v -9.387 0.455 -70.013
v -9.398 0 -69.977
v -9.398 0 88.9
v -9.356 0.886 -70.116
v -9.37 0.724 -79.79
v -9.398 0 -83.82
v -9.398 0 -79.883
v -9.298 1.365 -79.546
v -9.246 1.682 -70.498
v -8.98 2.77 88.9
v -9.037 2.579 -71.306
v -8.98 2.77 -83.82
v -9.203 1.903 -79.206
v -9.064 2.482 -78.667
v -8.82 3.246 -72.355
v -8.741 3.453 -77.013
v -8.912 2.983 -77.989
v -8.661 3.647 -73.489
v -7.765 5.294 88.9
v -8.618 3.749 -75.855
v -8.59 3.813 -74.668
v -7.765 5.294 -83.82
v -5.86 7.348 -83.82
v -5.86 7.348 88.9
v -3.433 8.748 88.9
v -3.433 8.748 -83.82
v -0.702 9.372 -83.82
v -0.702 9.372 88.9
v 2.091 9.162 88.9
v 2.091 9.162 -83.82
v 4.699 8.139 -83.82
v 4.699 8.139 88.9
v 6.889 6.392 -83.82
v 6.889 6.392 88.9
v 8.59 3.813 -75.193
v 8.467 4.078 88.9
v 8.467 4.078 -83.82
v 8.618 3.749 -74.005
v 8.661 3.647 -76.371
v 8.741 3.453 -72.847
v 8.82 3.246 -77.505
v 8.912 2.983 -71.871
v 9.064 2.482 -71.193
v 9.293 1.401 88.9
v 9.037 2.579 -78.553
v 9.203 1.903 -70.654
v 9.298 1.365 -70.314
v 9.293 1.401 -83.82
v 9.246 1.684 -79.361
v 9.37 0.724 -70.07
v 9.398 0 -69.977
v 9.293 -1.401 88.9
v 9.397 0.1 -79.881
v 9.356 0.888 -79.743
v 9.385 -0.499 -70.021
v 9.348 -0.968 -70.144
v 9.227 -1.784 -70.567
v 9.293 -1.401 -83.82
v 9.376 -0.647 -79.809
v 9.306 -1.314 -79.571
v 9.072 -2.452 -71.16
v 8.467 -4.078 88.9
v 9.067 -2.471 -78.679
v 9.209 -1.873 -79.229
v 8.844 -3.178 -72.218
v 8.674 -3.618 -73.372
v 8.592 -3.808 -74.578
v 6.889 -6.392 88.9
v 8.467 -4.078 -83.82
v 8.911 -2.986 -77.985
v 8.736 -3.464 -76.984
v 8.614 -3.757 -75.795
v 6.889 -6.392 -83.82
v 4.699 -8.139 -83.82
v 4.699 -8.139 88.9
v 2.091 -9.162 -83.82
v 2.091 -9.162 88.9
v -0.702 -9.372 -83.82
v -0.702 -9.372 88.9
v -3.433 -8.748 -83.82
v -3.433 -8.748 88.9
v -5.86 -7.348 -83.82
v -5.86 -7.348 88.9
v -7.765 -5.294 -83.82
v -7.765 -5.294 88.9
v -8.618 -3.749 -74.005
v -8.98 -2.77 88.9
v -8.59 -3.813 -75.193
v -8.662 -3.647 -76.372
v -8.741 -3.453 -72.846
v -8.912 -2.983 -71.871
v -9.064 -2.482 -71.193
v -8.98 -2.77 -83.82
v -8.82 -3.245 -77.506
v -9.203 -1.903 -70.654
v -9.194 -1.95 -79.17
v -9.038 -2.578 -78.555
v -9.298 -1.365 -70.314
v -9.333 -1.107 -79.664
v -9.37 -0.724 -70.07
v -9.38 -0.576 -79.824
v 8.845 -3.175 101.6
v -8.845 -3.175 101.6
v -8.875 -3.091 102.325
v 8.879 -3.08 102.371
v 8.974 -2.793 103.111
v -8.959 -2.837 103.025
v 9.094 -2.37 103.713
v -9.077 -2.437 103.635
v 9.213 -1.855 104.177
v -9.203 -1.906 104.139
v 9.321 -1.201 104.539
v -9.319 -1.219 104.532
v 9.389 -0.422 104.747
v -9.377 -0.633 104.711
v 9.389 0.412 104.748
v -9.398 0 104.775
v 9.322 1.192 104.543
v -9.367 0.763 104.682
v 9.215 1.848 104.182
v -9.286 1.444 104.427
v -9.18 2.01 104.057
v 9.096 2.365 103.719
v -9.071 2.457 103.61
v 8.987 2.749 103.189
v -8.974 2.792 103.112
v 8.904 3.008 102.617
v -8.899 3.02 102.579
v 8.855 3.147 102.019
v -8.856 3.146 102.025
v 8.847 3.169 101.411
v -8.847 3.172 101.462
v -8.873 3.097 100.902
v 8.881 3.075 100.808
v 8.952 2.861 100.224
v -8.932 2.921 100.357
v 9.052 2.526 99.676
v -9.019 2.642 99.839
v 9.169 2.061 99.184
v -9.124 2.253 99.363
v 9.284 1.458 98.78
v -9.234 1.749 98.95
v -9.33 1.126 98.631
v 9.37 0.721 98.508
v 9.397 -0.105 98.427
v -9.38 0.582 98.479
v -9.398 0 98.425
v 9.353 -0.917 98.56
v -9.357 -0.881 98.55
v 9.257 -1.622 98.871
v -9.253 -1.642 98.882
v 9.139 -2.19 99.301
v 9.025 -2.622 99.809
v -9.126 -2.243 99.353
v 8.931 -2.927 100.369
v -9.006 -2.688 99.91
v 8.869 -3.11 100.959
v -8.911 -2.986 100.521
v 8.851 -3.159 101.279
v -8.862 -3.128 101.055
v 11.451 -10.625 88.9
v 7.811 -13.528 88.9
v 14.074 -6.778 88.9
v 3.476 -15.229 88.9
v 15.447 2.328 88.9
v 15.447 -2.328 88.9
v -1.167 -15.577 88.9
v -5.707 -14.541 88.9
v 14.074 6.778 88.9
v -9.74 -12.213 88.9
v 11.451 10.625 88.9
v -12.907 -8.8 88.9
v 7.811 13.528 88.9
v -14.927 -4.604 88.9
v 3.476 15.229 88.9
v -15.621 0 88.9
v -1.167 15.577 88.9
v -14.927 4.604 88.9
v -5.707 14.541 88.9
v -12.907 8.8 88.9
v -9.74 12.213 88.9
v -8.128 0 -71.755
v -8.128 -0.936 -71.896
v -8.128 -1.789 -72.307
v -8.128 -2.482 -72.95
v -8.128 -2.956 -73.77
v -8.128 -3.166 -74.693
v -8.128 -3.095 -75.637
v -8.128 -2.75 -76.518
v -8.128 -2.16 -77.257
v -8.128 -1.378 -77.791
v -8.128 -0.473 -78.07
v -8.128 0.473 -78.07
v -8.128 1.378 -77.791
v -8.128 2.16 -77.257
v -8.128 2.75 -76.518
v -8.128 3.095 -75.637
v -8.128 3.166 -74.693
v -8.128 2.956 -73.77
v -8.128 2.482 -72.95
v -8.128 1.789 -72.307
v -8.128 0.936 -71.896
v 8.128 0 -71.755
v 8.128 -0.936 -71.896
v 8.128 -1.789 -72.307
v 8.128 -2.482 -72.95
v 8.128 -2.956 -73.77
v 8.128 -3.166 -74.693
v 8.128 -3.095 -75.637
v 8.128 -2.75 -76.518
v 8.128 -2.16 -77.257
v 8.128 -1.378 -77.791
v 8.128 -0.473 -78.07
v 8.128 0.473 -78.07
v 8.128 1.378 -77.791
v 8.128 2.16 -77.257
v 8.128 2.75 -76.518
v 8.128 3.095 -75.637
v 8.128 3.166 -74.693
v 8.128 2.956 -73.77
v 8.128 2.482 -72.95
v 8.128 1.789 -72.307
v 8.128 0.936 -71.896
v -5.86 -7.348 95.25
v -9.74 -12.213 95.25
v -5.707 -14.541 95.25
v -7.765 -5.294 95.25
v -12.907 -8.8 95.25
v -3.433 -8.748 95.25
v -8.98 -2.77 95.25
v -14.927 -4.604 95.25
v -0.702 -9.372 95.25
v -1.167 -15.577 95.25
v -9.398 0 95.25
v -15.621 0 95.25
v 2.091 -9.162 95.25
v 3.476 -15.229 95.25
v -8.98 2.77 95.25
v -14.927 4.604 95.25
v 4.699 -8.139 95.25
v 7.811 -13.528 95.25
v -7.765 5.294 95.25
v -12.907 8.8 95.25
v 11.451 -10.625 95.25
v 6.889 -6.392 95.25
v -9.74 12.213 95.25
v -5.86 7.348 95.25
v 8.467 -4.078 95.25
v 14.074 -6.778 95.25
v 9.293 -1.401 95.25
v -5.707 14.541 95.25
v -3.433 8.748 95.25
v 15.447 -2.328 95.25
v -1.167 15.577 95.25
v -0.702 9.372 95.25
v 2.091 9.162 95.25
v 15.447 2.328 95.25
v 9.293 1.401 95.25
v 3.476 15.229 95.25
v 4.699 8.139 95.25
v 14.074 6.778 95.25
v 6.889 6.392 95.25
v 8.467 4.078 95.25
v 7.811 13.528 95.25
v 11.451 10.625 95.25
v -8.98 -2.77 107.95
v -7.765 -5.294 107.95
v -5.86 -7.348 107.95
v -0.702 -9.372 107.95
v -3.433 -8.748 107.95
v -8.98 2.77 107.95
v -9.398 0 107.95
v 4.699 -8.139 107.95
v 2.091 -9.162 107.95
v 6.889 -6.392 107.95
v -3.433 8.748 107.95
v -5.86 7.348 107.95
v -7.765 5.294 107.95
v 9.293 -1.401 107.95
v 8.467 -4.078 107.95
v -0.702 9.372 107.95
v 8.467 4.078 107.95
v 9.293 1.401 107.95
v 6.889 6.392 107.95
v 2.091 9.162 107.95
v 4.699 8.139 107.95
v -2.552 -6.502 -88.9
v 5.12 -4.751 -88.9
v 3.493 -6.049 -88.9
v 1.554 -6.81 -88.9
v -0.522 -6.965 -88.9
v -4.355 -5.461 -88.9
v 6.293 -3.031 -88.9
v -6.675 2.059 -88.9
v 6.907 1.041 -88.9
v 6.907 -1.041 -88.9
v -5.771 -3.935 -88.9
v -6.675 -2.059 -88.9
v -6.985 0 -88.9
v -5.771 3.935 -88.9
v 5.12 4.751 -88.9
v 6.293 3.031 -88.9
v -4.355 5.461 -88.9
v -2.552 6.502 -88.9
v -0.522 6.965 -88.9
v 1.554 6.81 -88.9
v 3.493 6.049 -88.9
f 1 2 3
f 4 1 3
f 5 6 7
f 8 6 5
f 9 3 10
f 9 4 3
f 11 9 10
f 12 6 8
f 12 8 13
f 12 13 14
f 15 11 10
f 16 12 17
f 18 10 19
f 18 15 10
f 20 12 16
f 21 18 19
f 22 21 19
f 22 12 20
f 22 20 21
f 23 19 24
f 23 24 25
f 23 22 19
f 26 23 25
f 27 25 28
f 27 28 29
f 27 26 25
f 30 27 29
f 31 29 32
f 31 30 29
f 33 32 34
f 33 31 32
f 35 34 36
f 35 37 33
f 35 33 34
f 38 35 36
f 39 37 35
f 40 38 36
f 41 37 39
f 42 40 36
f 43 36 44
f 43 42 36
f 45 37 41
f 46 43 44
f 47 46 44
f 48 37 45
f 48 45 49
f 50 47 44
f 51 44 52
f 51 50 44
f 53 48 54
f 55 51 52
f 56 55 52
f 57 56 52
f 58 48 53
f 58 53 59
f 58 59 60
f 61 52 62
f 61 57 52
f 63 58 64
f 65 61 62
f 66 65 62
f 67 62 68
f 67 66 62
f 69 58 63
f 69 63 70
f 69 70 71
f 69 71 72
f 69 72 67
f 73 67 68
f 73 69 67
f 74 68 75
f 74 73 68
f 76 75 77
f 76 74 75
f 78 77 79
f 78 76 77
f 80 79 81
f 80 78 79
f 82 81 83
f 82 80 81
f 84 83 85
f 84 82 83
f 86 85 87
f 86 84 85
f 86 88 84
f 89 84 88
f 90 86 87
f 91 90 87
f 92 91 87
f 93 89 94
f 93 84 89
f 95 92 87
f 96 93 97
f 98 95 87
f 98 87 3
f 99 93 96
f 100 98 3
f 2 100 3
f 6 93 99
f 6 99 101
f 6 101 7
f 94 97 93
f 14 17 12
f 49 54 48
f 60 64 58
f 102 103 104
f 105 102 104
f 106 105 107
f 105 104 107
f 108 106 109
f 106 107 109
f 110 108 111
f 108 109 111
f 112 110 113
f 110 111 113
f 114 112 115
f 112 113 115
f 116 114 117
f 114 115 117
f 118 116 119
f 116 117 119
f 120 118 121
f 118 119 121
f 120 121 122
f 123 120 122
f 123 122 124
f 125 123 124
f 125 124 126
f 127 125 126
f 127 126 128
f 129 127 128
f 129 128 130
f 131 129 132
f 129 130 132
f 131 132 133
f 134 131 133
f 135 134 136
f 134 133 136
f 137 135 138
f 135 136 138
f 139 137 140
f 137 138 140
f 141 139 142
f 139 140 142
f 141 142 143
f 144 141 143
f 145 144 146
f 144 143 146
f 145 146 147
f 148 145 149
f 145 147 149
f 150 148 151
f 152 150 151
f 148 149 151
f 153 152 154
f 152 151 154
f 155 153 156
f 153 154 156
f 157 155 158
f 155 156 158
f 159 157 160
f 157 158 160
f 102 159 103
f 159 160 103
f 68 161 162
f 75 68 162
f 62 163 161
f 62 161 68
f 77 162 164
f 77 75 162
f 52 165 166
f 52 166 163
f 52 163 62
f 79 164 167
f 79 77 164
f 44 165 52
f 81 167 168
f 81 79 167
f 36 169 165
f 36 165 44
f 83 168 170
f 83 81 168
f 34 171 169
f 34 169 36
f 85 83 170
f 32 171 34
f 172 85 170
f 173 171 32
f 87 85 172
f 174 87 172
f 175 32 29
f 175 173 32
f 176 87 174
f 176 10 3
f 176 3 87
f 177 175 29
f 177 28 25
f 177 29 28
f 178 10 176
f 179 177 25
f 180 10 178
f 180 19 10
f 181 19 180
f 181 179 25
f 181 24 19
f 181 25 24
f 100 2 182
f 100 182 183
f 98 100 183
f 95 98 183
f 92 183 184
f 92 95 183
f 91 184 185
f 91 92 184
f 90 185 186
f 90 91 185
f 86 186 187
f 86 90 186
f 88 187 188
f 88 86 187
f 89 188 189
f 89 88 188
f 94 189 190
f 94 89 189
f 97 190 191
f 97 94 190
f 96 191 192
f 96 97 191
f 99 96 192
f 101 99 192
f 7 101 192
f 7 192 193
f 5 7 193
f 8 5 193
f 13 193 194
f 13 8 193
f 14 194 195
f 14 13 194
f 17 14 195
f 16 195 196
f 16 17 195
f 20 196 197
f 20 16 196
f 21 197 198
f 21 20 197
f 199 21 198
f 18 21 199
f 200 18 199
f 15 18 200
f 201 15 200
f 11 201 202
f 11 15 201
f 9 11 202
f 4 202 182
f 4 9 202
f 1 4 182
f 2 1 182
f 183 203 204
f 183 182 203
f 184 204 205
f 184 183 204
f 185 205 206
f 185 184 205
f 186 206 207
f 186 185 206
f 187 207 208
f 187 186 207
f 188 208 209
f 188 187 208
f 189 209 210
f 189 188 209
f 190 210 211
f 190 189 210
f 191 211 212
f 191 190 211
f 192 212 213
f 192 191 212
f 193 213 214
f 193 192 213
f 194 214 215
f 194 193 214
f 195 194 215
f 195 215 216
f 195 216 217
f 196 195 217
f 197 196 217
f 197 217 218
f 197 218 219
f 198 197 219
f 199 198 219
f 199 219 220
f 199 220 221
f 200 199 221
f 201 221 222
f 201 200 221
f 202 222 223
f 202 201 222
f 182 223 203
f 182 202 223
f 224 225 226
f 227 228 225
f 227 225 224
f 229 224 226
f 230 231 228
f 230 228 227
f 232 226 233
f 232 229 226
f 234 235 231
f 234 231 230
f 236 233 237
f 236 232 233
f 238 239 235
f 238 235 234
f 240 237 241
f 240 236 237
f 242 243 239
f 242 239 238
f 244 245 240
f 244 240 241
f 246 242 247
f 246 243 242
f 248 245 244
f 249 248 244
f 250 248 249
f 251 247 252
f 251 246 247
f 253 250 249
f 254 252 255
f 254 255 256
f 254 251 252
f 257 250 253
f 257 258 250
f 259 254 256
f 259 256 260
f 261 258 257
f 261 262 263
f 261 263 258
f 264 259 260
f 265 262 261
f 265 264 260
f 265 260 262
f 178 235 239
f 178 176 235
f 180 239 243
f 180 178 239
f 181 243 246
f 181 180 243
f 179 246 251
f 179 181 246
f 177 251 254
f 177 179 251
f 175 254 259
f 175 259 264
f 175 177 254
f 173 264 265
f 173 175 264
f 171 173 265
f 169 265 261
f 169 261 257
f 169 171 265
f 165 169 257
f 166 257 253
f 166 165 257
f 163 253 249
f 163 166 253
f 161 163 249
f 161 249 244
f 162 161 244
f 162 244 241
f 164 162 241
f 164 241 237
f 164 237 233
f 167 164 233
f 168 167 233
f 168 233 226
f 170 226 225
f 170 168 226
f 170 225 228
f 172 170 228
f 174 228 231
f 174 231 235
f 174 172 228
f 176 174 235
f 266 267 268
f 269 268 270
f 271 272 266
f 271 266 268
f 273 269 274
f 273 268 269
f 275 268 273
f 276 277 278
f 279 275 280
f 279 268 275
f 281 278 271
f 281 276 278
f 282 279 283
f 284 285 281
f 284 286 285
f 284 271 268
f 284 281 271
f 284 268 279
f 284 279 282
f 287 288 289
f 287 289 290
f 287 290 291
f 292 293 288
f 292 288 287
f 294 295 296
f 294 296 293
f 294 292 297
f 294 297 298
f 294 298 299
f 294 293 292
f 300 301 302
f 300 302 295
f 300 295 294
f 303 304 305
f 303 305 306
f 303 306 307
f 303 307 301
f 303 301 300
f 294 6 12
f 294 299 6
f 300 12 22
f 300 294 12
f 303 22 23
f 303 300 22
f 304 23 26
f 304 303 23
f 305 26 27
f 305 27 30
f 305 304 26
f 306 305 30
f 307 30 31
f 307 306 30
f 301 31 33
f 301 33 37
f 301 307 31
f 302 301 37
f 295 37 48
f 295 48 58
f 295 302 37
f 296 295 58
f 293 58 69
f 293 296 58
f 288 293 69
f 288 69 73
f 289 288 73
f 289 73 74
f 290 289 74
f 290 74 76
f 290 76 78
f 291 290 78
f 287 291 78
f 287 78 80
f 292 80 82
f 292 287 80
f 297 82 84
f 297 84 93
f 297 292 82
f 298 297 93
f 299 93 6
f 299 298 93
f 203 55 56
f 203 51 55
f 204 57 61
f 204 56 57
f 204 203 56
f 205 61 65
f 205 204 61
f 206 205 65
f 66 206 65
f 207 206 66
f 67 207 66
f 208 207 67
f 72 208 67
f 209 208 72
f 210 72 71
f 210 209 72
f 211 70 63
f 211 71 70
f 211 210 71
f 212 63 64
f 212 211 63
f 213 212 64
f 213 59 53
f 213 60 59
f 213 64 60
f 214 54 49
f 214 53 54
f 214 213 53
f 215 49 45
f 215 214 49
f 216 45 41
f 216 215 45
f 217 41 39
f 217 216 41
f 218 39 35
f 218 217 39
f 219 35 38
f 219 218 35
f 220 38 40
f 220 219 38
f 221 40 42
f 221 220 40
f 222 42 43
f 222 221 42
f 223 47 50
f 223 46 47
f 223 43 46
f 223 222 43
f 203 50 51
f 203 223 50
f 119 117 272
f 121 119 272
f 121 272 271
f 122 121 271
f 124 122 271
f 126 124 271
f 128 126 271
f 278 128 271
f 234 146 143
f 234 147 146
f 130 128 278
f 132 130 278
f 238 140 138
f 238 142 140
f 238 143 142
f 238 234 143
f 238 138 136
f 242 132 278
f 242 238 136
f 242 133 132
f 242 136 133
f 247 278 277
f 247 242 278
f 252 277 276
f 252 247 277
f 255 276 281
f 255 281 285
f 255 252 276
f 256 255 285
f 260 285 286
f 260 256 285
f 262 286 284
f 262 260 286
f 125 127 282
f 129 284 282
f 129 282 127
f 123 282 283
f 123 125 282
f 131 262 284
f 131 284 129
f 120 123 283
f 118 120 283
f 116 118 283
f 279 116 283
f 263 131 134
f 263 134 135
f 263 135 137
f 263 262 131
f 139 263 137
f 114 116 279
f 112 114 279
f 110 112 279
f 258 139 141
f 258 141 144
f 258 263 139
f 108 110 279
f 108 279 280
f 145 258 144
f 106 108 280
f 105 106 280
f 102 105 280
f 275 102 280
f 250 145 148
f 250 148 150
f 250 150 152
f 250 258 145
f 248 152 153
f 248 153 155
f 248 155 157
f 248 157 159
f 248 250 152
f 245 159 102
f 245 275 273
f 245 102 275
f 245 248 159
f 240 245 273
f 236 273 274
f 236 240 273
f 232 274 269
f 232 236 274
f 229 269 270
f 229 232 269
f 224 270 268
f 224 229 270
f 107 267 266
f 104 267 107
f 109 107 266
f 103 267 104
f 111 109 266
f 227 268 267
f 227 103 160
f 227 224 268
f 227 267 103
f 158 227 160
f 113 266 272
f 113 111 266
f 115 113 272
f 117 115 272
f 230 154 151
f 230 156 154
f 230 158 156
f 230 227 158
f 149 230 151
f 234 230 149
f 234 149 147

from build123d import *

# Parameters (mm, degrees)
F4_D = 6.35


with BuildPart() as f1:
    # F0 (on Front) → F1 (revolve)
    with BuildSketch(Plane.XZ):
        Polygon((-6.985, -88.9), (0, -88.9), (0, 107.95), (-9.398, 107.95), (-9.398, 95.25), (-15.621, 95.25), (-15.621, 88.9), (-9.398, 88.9), (-9.398, -83.82), align=None)
    revolve(axis=Axis((0, 0, 2.568085), (0, 0, -1)))

    # F4 (through all)
    with Locations(Plane.YZ.offset(25.4)):
        with Locations((0, 101.6)):
            Hole(F4_D / 2)

    # F5 (on Front) → F6 (revolve, cut)
    with BuildSketch(Plane.XZ):
        Polygon((-9.398, -69.977), (-9.398, -74.93), (9.398, -74.93), (9.398, -69.977), (8.128, -71.755), (-8.128, -71.755), align=None)
    revolve(axis=Axis((3.955706, 0, -74.93), (1, 0, 0)), mode=Mode.SUBTRACT)


solid = f1.part
